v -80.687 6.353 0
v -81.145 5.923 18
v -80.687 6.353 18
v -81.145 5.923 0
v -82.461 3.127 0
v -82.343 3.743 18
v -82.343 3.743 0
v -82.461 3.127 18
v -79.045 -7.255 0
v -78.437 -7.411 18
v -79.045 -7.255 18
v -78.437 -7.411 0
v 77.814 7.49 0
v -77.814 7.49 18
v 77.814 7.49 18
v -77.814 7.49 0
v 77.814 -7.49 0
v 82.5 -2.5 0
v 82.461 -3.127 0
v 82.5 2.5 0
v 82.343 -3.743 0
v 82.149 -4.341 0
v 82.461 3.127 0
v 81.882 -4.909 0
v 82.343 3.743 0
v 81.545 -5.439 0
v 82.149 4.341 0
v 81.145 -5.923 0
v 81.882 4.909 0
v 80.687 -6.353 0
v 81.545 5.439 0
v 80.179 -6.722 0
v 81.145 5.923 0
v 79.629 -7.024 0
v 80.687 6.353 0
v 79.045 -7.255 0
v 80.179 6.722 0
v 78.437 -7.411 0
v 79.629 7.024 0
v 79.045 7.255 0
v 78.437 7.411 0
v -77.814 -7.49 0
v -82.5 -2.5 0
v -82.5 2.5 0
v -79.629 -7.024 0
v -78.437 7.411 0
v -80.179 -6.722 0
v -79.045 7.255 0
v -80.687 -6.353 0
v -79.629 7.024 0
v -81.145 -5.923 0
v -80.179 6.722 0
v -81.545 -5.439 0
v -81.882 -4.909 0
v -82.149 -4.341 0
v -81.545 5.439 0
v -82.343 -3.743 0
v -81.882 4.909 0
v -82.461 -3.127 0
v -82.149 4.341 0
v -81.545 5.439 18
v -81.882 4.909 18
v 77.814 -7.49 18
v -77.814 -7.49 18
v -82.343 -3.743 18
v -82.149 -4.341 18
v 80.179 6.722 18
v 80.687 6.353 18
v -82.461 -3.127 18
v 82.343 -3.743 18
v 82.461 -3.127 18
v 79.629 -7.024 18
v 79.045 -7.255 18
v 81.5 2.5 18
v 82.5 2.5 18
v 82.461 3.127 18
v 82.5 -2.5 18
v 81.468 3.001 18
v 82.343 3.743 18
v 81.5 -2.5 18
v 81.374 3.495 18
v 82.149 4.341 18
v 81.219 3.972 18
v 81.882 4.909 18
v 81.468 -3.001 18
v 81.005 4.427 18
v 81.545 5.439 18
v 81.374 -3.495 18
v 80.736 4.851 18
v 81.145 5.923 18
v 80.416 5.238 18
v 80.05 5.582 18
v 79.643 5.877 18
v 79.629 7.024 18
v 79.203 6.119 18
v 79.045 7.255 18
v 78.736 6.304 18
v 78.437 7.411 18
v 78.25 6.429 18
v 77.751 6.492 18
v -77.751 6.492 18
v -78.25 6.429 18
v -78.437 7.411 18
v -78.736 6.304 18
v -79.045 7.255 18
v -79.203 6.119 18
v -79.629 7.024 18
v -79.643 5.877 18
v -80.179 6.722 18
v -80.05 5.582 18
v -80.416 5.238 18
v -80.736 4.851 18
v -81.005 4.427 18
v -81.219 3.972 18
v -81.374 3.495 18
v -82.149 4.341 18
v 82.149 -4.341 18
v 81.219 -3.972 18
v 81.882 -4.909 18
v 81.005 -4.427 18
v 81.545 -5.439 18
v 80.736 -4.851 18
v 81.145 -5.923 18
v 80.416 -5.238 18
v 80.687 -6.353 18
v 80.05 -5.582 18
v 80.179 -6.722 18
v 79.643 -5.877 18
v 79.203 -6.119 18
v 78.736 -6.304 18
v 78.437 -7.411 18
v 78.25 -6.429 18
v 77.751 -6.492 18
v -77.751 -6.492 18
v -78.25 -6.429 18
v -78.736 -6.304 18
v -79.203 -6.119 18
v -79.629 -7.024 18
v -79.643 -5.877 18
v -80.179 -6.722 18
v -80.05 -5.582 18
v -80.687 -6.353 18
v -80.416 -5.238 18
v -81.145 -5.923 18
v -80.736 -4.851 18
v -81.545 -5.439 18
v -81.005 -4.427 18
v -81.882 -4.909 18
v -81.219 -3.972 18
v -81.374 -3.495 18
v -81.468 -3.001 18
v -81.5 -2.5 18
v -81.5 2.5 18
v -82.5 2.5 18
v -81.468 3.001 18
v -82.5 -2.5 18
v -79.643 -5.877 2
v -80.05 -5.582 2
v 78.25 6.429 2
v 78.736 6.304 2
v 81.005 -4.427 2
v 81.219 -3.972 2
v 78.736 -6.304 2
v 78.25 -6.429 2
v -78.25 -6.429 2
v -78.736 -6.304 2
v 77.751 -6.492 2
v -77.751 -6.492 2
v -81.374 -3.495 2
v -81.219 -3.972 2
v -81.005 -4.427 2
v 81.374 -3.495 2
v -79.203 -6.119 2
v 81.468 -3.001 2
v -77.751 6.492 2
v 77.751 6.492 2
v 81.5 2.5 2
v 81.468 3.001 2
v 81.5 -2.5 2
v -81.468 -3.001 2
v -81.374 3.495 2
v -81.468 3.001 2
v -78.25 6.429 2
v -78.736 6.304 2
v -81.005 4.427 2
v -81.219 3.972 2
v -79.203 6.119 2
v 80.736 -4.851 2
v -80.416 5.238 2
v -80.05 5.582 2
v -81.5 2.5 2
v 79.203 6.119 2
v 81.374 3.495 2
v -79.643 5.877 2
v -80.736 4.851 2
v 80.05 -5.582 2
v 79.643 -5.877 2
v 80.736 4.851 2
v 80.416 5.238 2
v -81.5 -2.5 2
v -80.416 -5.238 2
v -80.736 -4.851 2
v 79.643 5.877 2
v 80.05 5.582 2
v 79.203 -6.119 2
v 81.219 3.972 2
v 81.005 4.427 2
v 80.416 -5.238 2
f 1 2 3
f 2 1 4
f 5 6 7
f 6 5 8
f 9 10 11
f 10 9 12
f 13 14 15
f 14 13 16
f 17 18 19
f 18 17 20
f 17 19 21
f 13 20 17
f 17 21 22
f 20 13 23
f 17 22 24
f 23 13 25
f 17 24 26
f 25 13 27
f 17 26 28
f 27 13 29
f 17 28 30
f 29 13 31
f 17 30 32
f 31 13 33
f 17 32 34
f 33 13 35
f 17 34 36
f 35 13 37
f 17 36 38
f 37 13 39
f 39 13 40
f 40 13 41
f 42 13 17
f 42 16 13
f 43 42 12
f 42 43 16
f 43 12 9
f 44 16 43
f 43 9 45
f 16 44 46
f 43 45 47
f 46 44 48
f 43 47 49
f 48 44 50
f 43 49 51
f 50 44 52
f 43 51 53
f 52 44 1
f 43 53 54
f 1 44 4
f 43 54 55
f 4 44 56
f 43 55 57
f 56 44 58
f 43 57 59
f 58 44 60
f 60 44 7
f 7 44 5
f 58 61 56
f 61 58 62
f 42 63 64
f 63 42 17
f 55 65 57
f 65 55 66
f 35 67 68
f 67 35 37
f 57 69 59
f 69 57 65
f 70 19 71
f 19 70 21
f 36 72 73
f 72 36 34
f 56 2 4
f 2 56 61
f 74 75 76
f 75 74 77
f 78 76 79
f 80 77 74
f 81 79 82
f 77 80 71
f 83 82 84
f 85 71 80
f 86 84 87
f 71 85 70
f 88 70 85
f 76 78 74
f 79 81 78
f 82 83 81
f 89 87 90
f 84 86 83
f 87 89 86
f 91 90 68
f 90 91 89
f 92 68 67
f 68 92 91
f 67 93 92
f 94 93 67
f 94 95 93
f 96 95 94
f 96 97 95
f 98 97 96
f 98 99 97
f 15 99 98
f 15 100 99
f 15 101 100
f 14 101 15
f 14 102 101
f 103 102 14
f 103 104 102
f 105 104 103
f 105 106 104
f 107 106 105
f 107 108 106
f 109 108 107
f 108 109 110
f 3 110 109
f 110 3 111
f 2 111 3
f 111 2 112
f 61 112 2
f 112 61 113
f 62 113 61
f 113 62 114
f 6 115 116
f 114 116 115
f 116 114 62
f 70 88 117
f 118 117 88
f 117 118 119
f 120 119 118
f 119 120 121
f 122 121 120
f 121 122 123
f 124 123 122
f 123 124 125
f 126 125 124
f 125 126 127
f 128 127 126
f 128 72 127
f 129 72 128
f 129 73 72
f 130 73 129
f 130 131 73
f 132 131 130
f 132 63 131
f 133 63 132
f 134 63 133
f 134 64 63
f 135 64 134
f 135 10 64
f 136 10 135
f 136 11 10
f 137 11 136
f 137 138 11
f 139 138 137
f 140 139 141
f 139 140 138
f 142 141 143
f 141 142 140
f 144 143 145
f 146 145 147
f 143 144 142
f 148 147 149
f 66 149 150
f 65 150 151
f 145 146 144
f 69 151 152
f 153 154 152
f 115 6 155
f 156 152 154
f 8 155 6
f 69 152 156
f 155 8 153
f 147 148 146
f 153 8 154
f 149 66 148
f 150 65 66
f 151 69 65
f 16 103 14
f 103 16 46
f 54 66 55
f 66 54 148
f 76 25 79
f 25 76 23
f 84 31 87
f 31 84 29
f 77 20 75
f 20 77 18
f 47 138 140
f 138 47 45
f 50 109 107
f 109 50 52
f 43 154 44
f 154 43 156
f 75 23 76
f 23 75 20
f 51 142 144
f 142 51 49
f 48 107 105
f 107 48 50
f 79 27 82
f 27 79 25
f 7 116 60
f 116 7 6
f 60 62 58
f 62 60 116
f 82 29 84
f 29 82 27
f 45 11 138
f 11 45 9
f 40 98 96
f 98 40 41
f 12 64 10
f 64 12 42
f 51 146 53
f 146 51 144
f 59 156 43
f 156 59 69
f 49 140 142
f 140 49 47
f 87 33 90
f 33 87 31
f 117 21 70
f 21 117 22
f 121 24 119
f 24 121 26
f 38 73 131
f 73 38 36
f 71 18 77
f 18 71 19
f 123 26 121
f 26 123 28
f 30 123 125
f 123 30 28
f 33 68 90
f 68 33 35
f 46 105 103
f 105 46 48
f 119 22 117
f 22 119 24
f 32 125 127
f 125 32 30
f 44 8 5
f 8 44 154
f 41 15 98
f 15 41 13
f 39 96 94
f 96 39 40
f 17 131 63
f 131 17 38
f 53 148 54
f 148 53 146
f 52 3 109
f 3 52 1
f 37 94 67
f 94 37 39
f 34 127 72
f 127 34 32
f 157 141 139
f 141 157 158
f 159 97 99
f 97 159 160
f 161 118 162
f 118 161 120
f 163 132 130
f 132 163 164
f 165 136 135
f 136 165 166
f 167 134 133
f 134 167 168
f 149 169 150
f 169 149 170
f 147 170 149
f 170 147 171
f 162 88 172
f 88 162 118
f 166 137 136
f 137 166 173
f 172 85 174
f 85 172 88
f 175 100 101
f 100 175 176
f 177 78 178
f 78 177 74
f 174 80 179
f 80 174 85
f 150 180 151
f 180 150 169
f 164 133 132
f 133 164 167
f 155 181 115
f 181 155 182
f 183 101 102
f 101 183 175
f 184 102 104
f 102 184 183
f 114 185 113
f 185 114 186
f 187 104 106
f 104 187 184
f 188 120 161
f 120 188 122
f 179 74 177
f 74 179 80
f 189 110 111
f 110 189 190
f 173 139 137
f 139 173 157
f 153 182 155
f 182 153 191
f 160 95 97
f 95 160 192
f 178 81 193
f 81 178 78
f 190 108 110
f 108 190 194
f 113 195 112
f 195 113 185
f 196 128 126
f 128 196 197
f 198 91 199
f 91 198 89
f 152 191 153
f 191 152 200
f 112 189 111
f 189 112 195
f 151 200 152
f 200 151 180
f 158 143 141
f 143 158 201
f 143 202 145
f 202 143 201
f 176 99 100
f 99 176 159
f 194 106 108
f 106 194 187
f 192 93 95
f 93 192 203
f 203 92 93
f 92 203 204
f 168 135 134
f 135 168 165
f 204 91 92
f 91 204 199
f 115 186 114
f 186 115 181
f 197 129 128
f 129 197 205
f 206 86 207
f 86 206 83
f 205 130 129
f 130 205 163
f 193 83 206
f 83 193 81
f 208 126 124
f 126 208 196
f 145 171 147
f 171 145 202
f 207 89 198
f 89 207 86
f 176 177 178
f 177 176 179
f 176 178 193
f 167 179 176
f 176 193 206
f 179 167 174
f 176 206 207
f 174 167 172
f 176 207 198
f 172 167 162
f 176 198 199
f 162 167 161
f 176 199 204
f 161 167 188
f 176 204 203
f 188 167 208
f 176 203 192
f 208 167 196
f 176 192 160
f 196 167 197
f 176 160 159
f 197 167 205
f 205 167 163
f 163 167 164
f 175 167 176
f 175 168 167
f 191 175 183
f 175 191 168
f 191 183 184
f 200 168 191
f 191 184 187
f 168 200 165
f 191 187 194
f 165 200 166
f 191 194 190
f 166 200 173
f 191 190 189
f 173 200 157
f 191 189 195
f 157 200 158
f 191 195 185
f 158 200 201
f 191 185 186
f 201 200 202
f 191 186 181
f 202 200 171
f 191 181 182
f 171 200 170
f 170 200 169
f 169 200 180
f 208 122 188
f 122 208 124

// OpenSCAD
$fn = 50;


difference() {
	union() {
		hull() {
			translate(v = [-77.5000000000, 2.5000000000, 0]) {
				cylinder(h = 18, r = 5);
			}
			translate(v = [77.5000000000, 2.5000000000, 0]) {
				cylinder(h = 18, r = 5);
			}
			translate(v = [-77.5000000000, -2.5000000000, 0]) {
				cylinder(h = 18, r = 5);
			}
			translate(v = [77.5000000000, -2.5000000000, 0]) {
				cylinder(h = 18, r = 5);
			}
		}
	}
	union() {
		translate(v = [0, 0, 2]) {
			hull() {
				translate(v = [-77.5000000000, 2.5000000000, 0]) {
					cylinder(h = 16, r = 4);
				}
				translate(v = [77.5000000000, 2.5000000000, 0]) {
					cylinder(h = 16, r = 4);
				}
				translate(v = [-77.5000000000, -2.5000000000, 0]) {
					cylinder(h = 16, r = 4);
				}
				translate(v = [77.5000000000, -2.5000000000, 0]) {
					cylinder(h = 16, r = 4);
				}
			}
		}
	}
}
